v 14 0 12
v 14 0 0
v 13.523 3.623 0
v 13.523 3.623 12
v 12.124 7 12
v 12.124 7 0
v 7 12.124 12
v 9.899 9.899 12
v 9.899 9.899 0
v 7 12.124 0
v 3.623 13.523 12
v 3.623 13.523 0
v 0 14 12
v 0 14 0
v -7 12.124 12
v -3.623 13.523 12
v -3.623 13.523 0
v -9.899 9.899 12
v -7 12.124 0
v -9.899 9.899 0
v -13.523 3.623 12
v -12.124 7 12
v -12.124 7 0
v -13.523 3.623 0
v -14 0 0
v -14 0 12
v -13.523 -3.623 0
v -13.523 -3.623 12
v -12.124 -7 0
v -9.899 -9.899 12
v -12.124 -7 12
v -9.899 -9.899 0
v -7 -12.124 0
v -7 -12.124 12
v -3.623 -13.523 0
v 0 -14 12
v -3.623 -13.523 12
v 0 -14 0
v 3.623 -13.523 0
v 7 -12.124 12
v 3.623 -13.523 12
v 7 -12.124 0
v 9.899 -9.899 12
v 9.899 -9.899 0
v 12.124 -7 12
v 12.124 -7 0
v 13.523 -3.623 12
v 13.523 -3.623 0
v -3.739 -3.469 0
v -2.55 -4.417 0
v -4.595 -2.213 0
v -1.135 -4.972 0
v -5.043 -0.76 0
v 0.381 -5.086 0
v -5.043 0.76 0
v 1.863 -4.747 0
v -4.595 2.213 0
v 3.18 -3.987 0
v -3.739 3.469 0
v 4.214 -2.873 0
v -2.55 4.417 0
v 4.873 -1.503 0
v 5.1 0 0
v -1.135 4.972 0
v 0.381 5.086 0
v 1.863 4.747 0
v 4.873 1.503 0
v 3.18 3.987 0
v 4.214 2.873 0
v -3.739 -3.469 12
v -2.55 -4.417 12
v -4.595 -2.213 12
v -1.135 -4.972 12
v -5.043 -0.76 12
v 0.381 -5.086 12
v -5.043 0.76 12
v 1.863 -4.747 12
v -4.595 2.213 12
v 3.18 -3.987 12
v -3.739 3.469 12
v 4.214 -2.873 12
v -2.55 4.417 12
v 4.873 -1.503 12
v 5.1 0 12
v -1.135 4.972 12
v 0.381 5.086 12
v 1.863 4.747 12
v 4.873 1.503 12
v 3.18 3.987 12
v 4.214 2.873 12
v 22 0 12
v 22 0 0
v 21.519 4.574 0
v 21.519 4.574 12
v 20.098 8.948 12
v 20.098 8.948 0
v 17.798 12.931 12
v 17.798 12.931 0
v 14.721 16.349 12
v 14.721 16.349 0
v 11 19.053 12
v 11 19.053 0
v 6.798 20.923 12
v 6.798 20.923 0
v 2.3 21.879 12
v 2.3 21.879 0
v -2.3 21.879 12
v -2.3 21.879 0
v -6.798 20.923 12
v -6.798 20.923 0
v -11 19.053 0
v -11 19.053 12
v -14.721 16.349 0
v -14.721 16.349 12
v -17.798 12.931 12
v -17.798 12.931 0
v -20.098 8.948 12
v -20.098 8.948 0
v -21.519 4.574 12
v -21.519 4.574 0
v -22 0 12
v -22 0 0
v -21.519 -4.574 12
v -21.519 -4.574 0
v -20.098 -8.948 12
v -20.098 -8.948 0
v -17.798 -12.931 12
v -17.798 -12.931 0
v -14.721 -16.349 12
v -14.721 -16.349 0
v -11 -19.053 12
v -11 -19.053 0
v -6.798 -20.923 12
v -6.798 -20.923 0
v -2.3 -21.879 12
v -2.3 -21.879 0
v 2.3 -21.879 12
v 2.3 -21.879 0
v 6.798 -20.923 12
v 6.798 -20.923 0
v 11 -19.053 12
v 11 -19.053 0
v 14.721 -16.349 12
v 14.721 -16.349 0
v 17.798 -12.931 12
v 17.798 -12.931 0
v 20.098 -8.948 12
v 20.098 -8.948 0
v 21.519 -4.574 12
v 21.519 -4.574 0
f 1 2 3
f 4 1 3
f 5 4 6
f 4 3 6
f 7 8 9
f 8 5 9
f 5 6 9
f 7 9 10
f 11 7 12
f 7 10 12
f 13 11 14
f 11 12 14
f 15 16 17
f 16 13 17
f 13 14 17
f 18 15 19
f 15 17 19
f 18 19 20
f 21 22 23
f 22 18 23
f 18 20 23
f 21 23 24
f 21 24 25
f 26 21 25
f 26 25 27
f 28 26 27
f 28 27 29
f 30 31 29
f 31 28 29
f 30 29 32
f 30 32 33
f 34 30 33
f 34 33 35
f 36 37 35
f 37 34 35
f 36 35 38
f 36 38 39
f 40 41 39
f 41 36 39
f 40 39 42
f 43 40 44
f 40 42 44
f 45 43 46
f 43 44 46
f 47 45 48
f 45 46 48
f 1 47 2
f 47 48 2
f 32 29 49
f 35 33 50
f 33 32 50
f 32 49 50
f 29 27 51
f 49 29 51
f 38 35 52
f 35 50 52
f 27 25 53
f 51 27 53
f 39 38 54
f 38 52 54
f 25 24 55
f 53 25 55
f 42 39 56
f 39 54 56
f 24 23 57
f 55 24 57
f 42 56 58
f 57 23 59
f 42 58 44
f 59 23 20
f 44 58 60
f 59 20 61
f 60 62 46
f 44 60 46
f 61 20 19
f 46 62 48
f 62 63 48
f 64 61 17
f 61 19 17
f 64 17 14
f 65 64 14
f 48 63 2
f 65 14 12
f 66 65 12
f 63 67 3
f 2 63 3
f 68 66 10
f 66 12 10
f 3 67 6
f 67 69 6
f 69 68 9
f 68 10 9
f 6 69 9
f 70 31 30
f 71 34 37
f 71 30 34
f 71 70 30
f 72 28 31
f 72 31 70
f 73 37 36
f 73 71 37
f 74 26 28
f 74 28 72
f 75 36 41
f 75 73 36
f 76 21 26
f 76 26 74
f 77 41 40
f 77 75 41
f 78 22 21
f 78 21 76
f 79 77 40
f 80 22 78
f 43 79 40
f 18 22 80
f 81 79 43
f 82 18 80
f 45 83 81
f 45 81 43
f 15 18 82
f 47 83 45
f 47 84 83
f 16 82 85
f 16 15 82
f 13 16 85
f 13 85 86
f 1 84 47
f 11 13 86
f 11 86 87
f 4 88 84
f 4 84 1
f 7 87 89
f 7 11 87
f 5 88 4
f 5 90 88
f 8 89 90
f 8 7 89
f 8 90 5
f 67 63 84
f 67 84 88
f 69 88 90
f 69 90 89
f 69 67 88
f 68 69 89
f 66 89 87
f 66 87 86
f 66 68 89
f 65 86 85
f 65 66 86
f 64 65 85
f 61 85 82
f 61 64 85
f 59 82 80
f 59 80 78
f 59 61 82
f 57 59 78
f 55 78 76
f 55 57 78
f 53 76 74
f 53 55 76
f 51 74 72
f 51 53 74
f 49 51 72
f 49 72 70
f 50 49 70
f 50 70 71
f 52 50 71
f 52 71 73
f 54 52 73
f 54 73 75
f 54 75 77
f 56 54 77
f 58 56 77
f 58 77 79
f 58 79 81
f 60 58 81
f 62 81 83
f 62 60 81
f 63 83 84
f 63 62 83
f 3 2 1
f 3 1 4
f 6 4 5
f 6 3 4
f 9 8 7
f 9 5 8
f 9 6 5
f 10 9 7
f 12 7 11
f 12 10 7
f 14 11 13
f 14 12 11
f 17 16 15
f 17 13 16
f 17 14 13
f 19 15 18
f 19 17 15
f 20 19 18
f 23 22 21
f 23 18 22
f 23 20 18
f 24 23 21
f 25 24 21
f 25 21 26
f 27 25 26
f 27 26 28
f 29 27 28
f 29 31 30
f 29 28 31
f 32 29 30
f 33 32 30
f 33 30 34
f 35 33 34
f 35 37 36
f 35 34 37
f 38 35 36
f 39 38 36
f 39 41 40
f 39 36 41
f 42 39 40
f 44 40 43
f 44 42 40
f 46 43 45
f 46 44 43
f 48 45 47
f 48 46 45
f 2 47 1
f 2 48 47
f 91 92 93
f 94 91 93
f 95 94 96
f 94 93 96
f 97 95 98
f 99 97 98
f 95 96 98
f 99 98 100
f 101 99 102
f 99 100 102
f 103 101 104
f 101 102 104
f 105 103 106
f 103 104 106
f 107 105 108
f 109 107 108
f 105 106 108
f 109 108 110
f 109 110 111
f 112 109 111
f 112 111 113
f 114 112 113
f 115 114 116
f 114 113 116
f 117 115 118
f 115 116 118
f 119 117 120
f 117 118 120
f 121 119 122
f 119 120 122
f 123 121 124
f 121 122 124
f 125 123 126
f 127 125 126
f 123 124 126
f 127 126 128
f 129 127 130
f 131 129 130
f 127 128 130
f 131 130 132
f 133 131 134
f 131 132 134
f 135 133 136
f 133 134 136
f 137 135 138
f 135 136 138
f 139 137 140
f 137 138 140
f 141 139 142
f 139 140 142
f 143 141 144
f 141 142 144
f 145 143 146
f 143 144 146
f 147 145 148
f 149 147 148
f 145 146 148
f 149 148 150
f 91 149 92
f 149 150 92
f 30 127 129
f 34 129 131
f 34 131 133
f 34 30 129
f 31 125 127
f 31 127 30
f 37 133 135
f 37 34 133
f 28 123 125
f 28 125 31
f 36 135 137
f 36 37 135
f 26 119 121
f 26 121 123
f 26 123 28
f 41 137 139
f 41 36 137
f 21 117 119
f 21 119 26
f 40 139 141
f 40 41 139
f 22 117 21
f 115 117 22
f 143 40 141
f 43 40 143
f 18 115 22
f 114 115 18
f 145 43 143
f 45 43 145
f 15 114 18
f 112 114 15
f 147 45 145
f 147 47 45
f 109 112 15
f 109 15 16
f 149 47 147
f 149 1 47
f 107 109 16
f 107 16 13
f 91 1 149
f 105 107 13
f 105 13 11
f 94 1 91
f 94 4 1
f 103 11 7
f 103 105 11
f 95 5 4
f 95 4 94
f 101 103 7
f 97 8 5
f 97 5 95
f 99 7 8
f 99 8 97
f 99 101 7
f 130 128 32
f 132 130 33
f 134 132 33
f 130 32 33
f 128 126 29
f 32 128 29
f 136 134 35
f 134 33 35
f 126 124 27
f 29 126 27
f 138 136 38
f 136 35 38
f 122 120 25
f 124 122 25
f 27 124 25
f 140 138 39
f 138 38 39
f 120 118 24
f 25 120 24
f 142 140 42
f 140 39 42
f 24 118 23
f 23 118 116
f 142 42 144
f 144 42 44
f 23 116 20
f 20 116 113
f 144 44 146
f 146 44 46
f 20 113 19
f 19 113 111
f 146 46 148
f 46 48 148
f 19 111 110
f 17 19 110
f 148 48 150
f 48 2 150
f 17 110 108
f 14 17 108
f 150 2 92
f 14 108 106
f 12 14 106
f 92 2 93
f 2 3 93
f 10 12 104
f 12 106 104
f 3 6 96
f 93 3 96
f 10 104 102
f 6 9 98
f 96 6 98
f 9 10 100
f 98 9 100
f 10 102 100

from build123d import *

# Parameters (mm, degrees)
SKETCH_1_R                     = 22
SKETCH_1_R_2                   = 5.1
EXTRUDE_1_DEPTH                = 12
SPLIT_BODIES_1_SURFACE_1_BACK  = 64.372
SPLIT_BODIES_1_SURFACE_1_DEPTH = 128.744
SPLIT_BODIES_1_SURFACE_2_BACK  = 64.372
SPLIT_BODIES_1_SURFACE_2_DEPTH = 128.744


with BuildPart() as part:
    # 草图1 → 凸台-拉伸1 (new body)
    with BuildSketch(Plane.XY):
        Circle(SKETCH_1_R)
        Circle(SKETCH_1_R_2, mode=Mode.SUBTRACT)
    extrude(amount=EXTRUDE_1_DEPTH)


with BuildPart() as body_2:
    # Split Bodies 1: the piece behind the surface
    add(part.part)
    # Split Bodies 1 surface: a surface, the sketch's curves swept straight by 128.744 mm
    with BuildLine(Plane.XY.offset(12).offset(-SPLIT_BODIES_1_SURFACE_1_BACK), mode=Mode.PRIVATE) as split_bodies_1_surface_1_path:
        CenterArc((0, 0), 14, 0, 360)
    split_bodies_1_surface_1 = Shell.extrude(split_bodies_1_surface_1_path.wire(), (0 * SPLIT_BODIES_1_SURFACE_1_DEPTH, 0 * SPLIT_BODIES_1_SURFACE_1_DEPTH, 1 * SPLIT_BODIES_1_SURFACE_1_DEPTH))
    split(bisect_by=split_bodies_1_surface_1, keep=Keep.BOTTOM)


with BuildPart() as part_1:
    add(part.part)

    # Split Bodies 1: split by a surface, the side it looks to stays
    # Split Bodies 1 surface: a surface, the sketch's curves swept straight by 128.744 mm
    with BuildLine(Plane.XY.offset(12).offset(-SPLIT_BODIES_1_SURFACE_2_BACK), mode=Mode.PRIVATE) as split_bodies_1_surface_2_path:
        CenterArc((0, 0), 14, 0, 360)
    split_bodies_1_surface_2 = Shell.extrude(split_bodies_1_surface_2_path.wire(), (0 * SPLIT_BODIES_1_SURFACE_2_DEPTH, 0 * SPLIT_BODIES_1_SURFACE_2_DEPTH, 1 * SPLIT_BODIES_1_SURFACE_2_DEPTH))
    split(bisect_by=split_bodies_1_surface_2, keep=Keep.TOP)


solid = Compound([body_2.part, part_1.part])
